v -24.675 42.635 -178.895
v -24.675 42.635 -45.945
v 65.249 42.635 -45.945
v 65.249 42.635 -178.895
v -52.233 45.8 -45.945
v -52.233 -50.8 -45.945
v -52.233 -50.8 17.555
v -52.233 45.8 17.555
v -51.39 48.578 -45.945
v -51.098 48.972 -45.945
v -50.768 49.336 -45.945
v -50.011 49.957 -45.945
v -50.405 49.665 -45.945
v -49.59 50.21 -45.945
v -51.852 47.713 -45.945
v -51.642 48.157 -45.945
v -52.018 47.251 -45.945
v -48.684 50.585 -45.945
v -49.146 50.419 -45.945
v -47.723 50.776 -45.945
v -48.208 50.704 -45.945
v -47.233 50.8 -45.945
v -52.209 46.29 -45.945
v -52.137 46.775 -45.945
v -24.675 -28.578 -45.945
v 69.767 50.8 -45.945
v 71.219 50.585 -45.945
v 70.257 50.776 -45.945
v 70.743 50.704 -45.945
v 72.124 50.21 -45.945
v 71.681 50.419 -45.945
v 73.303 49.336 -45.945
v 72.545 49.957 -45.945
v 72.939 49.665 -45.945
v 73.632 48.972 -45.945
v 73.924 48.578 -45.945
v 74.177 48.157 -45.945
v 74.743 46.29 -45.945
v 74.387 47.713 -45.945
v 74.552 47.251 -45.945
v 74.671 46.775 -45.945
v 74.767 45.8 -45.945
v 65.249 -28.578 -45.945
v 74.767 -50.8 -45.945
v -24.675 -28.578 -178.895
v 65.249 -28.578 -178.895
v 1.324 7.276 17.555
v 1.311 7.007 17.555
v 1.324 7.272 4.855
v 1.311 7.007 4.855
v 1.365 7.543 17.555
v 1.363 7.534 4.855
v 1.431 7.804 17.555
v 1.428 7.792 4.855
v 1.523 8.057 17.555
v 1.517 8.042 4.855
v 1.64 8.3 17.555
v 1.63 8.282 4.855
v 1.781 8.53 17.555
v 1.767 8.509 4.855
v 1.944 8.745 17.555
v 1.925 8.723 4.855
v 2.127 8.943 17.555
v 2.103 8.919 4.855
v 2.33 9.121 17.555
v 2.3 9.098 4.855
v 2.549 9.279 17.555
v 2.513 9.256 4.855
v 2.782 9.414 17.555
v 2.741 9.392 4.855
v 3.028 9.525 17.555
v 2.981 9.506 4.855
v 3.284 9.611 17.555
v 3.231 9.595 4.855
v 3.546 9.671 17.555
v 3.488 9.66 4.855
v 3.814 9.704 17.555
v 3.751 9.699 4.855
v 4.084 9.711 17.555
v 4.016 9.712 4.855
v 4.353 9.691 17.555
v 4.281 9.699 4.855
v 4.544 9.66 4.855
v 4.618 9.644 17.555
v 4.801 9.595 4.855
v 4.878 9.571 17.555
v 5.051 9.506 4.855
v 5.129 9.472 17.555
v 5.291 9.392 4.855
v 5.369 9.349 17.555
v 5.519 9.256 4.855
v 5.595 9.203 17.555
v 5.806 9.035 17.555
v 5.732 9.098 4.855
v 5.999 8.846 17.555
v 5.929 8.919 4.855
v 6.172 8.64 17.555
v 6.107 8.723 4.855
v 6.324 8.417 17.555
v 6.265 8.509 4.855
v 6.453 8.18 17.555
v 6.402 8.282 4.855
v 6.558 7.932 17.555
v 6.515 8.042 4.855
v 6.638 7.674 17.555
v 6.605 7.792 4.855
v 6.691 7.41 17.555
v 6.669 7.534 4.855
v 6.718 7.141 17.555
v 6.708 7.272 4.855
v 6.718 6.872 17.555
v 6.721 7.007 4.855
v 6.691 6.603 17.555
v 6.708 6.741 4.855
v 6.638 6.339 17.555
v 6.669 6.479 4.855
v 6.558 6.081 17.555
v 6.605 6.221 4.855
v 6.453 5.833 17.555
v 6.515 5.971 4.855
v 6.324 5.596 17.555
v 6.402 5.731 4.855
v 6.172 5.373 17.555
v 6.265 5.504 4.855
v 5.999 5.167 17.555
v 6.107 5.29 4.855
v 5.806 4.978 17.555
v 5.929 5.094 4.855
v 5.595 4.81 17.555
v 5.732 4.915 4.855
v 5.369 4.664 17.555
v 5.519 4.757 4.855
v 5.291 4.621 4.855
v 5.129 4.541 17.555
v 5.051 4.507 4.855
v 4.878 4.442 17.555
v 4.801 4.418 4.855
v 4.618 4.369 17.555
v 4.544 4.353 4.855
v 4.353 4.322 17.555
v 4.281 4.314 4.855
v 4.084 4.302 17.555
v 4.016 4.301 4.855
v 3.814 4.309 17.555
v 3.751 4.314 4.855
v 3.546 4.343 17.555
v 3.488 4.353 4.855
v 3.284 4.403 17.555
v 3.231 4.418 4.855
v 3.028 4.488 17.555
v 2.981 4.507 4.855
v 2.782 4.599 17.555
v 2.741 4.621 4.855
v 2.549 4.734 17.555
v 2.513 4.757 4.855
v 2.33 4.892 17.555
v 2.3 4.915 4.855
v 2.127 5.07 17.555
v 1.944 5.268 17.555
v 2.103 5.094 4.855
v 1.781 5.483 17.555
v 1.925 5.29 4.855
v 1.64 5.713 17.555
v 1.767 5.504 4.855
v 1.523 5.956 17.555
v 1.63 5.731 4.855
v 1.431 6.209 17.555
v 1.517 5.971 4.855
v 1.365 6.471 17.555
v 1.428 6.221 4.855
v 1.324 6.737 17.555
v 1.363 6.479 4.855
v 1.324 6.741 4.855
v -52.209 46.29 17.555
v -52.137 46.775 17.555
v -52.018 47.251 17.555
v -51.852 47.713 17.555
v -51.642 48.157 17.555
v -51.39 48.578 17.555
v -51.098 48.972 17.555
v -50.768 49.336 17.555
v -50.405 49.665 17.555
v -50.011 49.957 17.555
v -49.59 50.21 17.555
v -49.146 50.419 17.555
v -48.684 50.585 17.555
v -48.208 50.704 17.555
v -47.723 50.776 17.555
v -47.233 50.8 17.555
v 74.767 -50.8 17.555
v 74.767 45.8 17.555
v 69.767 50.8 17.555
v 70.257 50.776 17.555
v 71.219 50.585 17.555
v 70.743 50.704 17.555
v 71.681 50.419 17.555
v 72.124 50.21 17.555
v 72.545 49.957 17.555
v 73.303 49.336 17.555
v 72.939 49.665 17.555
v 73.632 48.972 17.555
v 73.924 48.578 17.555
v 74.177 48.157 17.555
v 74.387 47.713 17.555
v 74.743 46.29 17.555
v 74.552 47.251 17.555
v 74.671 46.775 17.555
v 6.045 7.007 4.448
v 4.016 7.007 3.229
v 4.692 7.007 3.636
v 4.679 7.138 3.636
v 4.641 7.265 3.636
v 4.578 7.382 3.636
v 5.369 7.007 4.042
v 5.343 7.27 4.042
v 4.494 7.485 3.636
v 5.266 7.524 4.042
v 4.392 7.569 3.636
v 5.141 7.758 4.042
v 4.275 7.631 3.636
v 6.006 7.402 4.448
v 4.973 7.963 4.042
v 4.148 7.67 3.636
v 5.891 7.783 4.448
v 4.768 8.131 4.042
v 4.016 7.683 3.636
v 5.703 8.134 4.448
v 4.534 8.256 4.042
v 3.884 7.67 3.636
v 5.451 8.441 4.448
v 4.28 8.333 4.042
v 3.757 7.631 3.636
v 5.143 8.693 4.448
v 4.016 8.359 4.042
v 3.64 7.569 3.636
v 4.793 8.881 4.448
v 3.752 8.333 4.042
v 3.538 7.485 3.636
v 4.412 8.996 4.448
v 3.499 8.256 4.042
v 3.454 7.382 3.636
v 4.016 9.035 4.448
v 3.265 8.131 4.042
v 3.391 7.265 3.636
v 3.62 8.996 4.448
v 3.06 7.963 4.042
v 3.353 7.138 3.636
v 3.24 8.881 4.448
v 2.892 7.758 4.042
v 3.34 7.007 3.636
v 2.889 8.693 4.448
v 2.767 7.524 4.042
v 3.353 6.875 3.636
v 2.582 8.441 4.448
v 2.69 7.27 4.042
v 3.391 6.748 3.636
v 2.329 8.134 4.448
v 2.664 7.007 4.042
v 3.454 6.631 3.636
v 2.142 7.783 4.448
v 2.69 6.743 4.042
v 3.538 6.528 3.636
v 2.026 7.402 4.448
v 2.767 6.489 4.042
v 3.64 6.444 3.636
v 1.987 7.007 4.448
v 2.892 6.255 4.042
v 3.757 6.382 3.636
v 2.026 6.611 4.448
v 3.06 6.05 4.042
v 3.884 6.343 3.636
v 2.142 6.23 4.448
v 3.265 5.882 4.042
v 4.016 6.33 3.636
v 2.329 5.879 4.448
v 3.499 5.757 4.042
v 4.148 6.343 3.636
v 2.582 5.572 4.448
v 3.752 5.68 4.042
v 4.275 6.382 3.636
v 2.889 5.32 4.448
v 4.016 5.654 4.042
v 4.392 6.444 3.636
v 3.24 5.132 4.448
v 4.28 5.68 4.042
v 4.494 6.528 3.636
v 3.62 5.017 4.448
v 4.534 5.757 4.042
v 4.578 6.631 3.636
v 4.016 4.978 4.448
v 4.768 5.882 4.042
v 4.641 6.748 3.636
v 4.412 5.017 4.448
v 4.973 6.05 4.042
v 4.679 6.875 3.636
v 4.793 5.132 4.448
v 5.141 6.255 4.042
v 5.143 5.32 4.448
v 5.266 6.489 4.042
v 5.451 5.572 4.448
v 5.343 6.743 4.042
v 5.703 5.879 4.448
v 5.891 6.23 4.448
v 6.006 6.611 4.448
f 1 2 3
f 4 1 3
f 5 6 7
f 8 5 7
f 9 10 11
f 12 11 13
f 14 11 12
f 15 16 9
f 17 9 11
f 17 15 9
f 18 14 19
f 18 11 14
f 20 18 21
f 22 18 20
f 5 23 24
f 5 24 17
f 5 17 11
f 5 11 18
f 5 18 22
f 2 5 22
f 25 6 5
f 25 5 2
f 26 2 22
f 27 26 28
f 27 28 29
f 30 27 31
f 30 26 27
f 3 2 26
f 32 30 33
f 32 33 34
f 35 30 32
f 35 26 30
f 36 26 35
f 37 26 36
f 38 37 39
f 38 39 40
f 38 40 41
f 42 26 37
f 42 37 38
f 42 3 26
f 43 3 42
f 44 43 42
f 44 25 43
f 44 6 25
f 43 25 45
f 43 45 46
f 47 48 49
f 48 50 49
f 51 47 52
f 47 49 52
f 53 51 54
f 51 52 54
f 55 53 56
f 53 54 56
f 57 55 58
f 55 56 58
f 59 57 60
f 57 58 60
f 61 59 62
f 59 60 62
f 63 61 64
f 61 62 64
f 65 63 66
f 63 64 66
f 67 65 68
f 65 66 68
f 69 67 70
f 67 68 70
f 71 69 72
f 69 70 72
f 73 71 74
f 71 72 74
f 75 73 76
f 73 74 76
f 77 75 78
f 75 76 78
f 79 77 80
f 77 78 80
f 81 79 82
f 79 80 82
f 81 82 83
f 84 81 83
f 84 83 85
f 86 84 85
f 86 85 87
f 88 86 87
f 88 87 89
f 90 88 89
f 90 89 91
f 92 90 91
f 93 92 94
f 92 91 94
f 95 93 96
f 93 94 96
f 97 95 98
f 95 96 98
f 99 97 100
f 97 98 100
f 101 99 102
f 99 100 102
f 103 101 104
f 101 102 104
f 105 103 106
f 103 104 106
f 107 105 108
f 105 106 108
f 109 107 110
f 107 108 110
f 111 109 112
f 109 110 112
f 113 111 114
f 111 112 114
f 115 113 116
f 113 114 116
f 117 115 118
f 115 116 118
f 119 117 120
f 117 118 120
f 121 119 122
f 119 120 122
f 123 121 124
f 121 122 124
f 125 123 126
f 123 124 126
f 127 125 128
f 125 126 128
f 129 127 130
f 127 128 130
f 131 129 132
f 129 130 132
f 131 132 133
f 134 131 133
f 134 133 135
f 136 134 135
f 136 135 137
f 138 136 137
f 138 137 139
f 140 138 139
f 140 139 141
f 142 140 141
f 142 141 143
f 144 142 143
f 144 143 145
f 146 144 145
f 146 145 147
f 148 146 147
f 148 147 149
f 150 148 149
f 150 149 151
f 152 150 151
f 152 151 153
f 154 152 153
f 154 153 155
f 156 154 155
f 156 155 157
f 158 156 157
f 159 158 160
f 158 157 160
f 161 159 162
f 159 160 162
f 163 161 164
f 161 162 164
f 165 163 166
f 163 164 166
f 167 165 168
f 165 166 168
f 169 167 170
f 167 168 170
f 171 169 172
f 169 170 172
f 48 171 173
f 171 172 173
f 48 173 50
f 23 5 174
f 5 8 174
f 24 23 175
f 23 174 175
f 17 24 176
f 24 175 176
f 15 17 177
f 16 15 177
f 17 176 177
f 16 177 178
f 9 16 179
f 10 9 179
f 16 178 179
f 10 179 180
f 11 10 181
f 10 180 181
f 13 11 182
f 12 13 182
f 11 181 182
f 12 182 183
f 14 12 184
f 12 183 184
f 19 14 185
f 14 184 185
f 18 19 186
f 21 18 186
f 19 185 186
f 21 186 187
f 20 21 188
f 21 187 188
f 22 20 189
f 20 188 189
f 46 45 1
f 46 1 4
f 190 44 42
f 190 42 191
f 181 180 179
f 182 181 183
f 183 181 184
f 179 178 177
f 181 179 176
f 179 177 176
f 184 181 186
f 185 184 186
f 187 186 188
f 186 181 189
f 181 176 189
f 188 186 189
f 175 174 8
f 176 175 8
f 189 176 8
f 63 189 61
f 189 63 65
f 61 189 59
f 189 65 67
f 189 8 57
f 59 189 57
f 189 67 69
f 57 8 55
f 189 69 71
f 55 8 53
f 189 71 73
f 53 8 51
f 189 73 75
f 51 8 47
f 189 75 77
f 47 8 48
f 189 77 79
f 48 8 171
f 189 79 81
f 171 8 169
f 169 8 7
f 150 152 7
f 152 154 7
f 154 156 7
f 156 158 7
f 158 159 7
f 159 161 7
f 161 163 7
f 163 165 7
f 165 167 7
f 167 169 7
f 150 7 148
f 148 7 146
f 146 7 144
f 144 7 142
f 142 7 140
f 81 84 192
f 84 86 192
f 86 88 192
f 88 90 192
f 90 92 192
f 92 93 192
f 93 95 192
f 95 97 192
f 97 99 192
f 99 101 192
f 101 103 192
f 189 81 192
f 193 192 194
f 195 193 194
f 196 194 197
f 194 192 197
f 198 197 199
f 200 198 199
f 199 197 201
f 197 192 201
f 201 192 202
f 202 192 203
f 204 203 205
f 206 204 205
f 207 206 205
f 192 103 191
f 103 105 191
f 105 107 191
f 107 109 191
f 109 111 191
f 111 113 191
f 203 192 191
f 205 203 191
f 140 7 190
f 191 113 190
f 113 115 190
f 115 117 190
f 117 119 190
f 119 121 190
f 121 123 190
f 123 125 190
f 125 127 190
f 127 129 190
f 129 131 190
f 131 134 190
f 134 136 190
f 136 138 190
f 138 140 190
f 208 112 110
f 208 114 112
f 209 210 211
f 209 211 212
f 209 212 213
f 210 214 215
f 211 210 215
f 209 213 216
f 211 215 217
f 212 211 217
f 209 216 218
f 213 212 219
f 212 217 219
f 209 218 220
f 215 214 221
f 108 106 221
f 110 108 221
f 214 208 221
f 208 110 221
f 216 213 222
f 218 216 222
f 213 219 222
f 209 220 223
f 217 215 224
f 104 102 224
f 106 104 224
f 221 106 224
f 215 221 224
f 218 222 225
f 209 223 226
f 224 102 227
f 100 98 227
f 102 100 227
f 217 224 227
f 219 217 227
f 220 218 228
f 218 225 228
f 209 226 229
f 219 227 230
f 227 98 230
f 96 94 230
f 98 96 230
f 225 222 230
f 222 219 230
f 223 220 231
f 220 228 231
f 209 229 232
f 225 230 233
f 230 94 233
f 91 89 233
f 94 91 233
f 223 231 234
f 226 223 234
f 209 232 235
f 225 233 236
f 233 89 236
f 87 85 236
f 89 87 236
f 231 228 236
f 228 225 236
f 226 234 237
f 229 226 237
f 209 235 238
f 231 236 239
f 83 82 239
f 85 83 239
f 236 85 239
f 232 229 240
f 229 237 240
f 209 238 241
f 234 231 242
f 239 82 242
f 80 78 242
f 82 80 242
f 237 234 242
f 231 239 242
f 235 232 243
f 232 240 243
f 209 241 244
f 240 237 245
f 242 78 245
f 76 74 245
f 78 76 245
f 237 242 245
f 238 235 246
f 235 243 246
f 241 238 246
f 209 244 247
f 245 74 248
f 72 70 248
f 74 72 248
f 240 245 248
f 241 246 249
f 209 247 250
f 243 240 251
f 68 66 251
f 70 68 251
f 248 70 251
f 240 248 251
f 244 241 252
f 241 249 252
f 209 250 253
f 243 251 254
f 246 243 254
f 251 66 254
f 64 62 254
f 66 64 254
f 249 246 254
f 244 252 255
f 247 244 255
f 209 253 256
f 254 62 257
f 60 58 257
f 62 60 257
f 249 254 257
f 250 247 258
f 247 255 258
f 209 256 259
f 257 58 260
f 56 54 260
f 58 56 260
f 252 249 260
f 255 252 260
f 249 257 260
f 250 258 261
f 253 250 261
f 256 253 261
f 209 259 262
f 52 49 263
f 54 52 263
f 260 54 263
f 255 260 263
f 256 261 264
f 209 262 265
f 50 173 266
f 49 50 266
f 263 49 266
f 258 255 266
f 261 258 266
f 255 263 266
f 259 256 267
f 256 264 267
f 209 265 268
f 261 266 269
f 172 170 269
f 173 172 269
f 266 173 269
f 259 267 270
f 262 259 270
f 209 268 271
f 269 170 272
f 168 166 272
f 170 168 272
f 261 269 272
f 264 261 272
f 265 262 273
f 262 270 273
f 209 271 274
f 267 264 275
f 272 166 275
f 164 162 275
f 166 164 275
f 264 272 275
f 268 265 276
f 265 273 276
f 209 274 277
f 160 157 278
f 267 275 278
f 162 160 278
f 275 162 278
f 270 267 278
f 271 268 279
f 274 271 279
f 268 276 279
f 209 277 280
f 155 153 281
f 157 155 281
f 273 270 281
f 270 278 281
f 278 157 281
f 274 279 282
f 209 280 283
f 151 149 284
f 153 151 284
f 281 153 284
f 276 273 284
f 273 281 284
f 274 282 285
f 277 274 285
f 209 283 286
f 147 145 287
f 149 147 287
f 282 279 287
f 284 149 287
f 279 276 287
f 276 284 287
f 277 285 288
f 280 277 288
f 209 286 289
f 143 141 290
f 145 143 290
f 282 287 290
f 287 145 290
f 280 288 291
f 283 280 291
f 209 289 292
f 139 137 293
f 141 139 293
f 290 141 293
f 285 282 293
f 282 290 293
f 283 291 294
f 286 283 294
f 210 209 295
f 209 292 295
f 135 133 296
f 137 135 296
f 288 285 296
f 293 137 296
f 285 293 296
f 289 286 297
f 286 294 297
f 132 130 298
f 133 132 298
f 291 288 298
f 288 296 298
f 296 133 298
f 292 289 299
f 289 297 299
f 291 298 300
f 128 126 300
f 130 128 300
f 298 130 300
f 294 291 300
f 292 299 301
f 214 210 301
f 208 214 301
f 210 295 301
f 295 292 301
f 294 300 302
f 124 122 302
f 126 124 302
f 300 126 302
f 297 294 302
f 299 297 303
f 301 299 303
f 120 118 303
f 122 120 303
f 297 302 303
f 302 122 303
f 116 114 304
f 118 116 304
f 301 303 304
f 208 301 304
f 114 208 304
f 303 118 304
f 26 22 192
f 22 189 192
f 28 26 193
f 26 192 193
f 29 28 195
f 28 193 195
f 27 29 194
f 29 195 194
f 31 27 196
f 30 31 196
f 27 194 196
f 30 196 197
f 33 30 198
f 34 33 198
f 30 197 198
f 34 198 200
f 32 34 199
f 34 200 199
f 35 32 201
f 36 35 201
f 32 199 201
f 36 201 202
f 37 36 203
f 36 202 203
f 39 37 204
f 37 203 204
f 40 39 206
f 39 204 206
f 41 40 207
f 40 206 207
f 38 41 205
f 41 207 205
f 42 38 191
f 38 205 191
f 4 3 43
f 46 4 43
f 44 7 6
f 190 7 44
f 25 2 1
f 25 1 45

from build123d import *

# Parameters (mm, degrees)
F0_W     = 127
F0_H     = 63.5
F1_DEPTH = 50.8
F3_D     = 5.4102
F3_DEPTH = 12.7
F3_TIP   = 1.6253880605
F6_W     = 89.9240933359
F6_H     = 71.2126605213
F5_DEPTH = 132.9497303814
F7_R     = 5


with BuildPart() as f1:
    # F0 (on Front) → F1 (new body, symmetric)
    with BuildSketch(Plane.XZ):
        with Locations((11.2671367824, -14.1953701283)):
            Rectangle(F0_W, F0_H)
    extrude(amount=F1_DEPTH, both=True)

    # F3
    with Locations(Plane.XY.offset(17.5546298717)):
        with Locations((4.0161549114, 7.0065222681)):
            Hole(F3_D / 2, depth=F3_DEPTH)
            with Locations((0, 0, -(F3_DEPTH + F3_TIP / 2))):  # 118° drill point
                Cone(0, F3_D / 2, F3_TIP, mode=Mode.SUBTRACT)

    # F6 (on face) → F5 (join)
    with BuildSketch(Plane(origin=(0, 0, -45.9453701283), x_dir=(1, 0, 0), z_dir=(0, 0, -1))):
        with Locations((20.2872846276, -7.0287231356)):
            Rectangle(F6_W, F6_H)
    extrude(amount=F5_DEPTH)

    # F7
    f7_edges = [f1.edges().sort_by_distance(p)[0] for p in [
        (74.767137, 50.8, -14.19537),
        (-52.232863, 50.8, -14.19537),
    ]]
    fillet(f7_edges, radius=F7_R)


solid = f1.part
